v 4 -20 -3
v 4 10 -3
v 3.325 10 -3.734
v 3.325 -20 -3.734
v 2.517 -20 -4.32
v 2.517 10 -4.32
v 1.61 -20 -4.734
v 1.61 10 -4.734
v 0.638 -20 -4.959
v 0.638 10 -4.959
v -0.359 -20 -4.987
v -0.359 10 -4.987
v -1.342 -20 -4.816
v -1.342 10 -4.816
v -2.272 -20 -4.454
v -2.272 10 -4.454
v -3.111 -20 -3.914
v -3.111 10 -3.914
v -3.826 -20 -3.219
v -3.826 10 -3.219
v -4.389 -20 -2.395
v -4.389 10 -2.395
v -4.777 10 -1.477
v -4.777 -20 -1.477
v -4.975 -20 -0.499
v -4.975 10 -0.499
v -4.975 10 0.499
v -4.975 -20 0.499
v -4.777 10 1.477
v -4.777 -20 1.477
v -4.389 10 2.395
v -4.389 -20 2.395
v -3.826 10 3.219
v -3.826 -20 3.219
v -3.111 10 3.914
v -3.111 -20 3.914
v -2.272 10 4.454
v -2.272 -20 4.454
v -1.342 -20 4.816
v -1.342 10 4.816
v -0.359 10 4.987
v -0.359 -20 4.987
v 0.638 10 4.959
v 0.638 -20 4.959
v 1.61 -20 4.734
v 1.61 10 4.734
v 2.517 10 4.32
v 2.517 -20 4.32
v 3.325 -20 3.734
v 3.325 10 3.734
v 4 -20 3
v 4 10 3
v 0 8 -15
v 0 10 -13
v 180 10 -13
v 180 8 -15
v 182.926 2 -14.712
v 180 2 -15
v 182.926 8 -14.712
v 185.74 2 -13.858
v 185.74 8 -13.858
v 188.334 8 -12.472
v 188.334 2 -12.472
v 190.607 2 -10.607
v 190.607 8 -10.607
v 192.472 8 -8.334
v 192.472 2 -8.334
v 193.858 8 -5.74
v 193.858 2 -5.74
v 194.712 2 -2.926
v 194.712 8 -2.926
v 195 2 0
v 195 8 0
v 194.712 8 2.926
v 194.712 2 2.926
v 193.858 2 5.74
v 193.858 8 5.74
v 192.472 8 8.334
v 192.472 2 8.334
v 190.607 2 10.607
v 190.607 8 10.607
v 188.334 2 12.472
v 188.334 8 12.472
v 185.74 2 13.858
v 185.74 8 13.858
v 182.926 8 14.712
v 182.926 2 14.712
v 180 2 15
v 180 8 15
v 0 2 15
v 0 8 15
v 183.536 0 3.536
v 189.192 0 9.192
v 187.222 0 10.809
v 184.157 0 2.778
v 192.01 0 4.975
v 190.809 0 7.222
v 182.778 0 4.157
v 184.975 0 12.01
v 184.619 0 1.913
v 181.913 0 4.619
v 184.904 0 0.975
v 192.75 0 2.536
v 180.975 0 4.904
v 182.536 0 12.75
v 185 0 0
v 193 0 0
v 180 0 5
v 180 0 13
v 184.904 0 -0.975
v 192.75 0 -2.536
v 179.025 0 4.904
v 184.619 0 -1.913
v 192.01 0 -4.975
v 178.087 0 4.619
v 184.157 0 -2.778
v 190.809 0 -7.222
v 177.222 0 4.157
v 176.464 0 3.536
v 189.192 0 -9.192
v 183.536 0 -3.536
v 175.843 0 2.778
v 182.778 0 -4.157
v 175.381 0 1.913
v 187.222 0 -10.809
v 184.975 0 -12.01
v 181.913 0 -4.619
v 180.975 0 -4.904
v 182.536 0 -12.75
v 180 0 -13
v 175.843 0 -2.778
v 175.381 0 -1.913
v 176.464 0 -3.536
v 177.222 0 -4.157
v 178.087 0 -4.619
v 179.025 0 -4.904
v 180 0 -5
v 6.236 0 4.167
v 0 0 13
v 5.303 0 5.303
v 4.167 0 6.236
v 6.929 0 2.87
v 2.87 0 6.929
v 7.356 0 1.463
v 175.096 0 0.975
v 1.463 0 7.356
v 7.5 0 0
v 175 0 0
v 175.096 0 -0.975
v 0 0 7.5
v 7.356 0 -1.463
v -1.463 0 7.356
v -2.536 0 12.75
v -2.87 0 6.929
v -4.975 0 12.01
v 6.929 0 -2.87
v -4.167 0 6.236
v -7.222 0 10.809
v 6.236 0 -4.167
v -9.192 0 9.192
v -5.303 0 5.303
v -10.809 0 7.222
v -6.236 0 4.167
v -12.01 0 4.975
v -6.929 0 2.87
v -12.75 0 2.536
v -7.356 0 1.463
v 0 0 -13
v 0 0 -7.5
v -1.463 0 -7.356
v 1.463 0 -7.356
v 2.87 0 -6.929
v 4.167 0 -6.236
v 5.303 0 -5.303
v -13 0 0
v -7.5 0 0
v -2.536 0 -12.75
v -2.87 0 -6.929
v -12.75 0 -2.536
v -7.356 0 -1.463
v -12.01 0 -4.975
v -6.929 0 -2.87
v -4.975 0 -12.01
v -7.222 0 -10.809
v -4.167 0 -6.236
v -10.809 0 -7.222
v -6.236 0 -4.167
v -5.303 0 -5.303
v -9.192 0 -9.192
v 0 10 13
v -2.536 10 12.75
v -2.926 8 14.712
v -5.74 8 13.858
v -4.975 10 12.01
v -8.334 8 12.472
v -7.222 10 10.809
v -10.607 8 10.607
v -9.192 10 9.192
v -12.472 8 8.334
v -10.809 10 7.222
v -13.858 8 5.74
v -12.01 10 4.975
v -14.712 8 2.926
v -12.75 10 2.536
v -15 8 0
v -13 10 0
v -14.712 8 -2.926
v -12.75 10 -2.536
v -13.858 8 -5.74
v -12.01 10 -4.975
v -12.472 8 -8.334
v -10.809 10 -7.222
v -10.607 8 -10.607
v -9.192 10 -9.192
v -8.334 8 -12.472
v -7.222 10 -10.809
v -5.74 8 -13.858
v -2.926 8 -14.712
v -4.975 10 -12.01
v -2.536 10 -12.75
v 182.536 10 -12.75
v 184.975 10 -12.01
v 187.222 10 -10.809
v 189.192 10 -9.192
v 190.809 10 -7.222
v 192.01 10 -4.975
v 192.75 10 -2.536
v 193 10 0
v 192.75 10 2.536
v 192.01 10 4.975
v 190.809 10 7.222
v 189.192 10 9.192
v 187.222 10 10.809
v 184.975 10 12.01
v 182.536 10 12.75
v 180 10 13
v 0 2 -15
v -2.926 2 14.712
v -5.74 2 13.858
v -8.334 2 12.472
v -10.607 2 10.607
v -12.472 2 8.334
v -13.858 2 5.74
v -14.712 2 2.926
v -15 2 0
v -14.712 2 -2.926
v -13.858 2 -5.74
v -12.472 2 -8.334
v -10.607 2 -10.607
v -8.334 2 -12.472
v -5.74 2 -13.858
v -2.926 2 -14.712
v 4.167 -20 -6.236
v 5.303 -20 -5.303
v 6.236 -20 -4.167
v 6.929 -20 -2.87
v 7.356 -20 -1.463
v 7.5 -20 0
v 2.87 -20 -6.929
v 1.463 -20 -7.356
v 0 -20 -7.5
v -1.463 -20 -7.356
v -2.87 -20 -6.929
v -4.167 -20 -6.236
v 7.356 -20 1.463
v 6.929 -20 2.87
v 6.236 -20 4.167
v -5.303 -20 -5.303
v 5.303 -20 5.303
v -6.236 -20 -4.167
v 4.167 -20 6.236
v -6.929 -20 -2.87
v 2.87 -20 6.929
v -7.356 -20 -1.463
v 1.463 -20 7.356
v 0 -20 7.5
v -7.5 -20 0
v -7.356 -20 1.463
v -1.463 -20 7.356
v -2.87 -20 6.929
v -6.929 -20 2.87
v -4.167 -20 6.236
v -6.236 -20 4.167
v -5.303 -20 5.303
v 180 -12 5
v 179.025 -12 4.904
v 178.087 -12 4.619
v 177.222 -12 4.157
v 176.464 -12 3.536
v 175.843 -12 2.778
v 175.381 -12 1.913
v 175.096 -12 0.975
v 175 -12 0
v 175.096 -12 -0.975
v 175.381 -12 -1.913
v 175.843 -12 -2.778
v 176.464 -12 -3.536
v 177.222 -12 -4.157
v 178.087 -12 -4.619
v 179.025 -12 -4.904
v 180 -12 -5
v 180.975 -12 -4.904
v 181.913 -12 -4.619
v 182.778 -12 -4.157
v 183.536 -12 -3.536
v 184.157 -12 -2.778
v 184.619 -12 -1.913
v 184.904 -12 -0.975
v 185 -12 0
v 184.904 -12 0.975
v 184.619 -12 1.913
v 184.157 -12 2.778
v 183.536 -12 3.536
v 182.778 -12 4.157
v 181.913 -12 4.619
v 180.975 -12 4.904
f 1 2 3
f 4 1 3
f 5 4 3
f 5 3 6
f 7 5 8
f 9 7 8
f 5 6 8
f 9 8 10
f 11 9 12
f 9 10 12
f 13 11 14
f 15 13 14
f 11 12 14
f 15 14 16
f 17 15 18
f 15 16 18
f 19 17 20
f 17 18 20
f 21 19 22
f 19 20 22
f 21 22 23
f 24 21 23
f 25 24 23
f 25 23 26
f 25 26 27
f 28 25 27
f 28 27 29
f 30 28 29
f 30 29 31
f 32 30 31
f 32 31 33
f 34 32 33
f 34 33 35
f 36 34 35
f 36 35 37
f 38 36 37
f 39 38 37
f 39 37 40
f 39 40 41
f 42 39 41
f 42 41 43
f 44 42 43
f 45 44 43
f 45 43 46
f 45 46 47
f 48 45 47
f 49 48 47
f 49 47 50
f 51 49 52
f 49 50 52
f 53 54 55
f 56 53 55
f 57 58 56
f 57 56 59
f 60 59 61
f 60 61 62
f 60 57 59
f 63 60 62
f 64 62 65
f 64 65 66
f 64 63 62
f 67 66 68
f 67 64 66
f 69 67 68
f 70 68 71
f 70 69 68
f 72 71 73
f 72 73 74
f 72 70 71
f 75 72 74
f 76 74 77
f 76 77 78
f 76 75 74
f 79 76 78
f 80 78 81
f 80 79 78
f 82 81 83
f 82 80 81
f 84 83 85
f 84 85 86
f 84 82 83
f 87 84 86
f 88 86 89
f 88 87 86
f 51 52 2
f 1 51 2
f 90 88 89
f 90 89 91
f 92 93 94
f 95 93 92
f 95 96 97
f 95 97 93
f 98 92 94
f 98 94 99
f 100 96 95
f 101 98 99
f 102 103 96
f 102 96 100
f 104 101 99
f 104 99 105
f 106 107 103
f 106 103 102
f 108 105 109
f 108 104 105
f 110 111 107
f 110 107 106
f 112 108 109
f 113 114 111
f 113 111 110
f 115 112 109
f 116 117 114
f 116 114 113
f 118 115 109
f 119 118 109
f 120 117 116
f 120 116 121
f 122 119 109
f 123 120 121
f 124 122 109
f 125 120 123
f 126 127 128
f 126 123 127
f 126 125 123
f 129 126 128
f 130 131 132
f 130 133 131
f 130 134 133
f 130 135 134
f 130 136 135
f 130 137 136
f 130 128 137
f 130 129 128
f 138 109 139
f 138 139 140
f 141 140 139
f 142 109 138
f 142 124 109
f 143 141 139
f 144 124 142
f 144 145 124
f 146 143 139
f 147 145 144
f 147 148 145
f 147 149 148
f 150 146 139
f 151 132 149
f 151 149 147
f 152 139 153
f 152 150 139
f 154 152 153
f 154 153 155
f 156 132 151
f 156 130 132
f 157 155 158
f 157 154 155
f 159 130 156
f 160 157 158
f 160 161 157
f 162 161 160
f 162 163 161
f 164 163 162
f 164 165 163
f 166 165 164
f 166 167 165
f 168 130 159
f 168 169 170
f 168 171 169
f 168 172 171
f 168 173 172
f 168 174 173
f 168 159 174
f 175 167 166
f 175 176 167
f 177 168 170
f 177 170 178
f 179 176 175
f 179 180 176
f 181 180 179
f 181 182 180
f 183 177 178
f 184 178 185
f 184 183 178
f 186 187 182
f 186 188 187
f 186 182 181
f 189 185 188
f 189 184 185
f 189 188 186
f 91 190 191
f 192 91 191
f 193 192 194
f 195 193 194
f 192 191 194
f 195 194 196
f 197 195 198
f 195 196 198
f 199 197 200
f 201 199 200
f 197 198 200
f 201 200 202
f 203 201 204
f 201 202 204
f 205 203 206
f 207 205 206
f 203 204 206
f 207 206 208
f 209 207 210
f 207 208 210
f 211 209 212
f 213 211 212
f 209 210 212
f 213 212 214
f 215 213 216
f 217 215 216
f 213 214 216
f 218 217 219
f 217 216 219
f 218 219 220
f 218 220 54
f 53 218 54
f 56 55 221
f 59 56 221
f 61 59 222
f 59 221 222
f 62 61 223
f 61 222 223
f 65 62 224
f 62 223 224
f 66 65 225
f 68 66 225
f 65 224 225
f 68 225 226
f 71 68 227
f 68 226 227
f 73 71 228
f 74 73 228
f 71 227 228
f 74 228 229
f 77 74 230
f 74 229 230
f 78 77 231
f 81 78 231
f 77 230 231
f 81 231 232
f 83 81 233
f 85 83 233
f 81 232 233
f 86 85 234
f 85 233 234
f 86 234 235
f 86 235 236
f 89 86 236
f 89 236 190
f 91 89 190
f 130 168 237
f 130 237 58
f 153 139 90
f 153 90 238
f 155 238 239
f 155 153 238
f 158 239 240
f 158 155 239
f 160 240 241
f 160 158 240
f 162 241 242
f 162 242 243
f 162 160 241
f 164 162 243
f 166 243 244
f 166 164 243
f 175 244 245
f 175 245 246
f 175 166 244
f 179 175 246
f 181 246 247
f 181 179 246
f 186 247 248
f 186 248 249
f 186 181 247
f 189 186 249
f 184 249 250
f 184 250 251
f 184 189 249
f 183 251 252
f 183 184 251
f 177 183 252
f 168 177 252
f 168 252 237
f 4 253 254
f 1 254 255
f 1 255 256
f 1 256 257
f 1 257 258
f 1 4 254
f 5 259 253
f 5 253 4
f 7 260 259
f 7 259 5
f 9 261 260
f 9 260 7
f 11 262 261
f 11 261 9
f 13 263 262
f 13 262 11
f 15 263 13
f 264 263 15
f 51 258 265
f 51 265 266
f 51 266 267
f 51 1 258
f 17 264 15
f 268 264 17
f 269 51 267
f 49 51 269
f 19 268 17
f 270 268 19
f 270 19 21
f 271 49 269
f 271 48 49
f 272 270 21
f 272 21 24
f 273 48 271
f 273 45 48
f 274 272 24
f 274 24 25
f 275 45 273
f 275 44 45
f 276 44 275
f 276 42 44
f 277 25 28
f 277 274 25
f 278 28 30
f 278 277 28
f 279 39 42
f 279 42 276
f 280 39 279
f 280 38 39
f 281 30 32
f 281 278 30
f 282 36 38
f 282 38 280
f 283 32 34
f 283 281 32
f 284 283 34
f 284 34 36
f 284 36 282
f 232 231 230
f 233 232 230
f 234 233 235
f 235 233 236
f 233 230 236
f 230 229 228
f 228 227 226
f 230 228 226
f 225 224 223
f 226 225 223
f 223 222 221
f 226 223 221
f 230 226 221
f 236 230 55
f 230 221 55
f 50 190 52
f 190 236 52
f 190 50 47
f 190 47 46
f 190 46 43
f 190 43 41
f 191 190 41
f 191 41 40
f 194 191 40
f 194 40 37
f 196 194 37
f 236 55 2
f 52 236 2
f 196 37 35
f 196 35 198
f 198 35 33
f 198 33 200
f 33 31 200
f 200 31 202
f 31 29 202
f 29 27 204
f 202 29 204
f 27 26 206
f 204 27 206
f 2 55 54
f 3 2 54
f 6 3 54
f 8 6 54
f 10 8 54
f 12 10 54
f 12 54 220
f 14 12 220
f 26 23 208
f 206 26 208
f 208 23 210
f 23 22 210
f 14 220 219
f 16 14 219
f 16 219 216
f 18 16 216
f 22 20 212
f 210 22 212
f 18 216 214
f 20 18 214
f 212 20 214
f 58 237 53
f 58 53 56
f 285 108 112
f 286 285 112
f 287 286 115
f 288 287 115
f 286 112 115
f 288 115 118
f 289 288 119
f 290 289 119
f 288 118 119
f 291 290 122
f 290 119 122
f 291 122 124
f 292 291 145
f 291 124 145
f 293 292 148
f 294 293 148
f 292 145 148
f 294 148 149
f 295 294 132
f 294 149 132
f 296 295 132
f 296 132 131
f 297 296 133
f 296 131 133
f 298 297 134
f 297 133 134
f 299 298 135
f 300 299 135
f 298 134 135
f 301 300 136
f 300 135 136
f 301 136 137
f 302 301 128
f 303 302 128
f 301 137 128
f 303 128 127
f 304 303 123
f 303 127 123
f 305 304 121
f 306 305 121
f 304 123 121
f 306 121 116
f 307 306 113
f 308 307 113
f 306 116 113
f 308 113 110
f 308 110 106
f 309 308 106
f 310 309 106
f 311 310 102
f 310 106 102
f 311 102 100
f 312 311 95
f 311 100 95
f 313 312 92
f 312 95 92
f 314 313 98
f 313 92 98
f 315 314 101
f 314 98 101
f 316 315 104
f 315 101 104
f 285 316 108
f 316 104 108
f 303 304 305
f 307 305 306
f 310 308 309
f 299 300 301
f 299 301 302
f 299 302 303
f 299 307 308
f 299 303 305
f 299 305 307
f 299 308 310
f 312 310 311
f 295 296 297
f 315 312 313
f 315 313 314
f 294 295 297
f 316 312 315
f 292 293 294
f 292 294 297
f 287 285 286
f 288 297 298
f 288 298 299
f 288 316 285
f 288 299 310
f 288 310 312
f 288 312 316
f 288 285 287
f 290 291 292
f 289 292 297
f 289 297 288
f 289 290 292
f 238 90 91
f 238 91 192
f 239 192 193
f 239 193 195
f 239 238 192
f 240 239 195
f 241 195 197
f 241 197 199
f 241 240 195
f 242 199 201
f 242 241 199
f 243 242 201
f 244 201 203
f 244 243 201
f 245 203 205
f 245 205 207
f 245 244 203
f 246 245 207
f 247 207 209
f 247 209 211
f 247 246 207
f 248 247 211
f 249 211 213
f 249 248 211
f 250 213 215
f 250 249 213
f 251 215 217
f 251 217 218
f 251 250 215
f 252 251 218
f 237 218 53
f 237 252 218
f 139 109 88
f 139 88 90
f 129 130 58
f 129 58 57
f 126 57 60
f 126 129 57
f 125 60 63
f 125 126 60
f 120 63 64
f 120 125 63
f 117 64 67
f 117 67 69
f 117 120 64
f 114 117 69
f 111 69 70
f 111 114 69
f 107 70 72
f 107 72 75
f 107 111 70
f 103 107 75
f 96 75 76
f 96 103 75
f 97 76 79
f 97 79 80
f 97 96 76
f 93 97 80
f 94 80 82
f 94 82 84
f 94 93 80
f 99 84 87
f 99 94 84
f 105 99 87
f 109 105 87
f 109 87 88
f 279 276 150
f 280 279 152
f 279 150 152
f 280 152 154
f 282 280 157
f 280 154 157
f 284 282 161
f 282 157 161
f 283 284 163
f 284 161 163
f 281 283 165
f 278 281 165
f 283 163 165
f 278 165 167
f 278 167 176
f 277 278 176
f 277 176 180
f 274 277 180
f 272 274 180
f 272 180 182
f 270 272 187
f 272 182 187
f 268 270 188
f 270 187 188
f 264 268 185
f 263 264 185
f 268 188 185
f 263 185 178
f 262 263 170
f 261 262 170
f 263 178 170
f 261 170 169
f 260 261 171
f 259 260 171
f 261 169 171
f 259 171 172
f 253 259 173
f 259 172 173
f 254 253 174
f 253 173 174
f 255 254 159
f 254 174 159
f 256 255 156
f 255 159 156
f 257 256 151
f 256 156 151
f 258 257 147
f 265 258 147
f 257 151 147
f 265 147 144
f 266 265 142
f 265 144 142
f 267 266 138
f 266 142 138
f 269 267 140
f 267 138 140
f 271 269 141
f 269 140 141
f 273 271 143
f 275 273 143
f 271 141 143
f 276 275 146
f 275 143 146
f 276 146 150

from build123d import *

# Parameters (mm, degrees)
EXTRUDE_2_DEPTH          = 10
CHAMFER_1_SIZE           = 2
SKETCH_9_R               = 7.5
EXTRUDE_7_DEPTH          = 20
CUT_EXTRUDE_3_DEPTH      = 24
CUT_EXTRUDE_3_DEPTH_BACK = 197.596032513
SKETCH_11_R              = 5
EXTRUDE_8_DEPTH          = 12


with BuildPart() as part:
    # 草图1 → 凸台-拉伸2 (new body)
    with BuildSketch(Plane(origin=(0, 0, 0), x_dir=(1, 0, 0), z_dir=(0, 1, 0))):
        with BuildLine():
            Line((0, 15), (180, 15))
            ThreePointArc((180, 15), (195, 0), (180, -15))
            Line((180, -15), (0, -15))
            ThreePointArc((0, -15), (-15, 0), (0, 15))
        make_face()
    extrude(amount=EXTRUDE_2_DEPTH)

    # 倒角1
    chamfer_1_edges = [part.edges().sort_by_distance(p)[0] for p in [
        (90, 10, -15),
        (-15, 10, 0),
        (90, 10, 15),
        (-15, 0, 0),
        (90, 0, -15),
        (195, 0, 0),
        (90, 0, 15),
        (195, 10, 0),
    ]]
    chamfer(chamfer_1_edges, length=CHAMFER_1_SIZE)

    # 草图9 → 凸台-拉伸7 (add)
    with BuildSketch(Plane.XZ):
        with Locations(Location((0, 0, 0), (0, 0, 90))):
            Circle(SKETCH_9_R)
    extrude(amount=EXTRUDE_7_DEPTH)

    # 草图4 → 切除-拉伸3 (cut, two sides: drawn at the far end of the back side and taken through both)
    with BuildSketch(Plane.XZ.offset(-CUT_EXTRUDE_3_DEPTH_BACK)):
        with BuildLine():
            Line((4, 3), (4, -3))
            ThreePointArc((4, -3), (-5, 0), (4, 3))
        make_face()
    extrude(amount=CUT_EXTRUDE_3_DEPTH + CUT_EXTRUDE_3_DEPTH_BACK, mode=Mode.SUBTRACT)

    # 草图11 → 凸台-拉伸8 (add)
    with BuildSketch(Plane.XZ):
        with Locations(Location((180, 0, 0), (0, 0, 90))):
            Circle(SKETCH_11_R)
    extrude(amount=EXTRUDE_8_DEPTH)


solid = part.part
